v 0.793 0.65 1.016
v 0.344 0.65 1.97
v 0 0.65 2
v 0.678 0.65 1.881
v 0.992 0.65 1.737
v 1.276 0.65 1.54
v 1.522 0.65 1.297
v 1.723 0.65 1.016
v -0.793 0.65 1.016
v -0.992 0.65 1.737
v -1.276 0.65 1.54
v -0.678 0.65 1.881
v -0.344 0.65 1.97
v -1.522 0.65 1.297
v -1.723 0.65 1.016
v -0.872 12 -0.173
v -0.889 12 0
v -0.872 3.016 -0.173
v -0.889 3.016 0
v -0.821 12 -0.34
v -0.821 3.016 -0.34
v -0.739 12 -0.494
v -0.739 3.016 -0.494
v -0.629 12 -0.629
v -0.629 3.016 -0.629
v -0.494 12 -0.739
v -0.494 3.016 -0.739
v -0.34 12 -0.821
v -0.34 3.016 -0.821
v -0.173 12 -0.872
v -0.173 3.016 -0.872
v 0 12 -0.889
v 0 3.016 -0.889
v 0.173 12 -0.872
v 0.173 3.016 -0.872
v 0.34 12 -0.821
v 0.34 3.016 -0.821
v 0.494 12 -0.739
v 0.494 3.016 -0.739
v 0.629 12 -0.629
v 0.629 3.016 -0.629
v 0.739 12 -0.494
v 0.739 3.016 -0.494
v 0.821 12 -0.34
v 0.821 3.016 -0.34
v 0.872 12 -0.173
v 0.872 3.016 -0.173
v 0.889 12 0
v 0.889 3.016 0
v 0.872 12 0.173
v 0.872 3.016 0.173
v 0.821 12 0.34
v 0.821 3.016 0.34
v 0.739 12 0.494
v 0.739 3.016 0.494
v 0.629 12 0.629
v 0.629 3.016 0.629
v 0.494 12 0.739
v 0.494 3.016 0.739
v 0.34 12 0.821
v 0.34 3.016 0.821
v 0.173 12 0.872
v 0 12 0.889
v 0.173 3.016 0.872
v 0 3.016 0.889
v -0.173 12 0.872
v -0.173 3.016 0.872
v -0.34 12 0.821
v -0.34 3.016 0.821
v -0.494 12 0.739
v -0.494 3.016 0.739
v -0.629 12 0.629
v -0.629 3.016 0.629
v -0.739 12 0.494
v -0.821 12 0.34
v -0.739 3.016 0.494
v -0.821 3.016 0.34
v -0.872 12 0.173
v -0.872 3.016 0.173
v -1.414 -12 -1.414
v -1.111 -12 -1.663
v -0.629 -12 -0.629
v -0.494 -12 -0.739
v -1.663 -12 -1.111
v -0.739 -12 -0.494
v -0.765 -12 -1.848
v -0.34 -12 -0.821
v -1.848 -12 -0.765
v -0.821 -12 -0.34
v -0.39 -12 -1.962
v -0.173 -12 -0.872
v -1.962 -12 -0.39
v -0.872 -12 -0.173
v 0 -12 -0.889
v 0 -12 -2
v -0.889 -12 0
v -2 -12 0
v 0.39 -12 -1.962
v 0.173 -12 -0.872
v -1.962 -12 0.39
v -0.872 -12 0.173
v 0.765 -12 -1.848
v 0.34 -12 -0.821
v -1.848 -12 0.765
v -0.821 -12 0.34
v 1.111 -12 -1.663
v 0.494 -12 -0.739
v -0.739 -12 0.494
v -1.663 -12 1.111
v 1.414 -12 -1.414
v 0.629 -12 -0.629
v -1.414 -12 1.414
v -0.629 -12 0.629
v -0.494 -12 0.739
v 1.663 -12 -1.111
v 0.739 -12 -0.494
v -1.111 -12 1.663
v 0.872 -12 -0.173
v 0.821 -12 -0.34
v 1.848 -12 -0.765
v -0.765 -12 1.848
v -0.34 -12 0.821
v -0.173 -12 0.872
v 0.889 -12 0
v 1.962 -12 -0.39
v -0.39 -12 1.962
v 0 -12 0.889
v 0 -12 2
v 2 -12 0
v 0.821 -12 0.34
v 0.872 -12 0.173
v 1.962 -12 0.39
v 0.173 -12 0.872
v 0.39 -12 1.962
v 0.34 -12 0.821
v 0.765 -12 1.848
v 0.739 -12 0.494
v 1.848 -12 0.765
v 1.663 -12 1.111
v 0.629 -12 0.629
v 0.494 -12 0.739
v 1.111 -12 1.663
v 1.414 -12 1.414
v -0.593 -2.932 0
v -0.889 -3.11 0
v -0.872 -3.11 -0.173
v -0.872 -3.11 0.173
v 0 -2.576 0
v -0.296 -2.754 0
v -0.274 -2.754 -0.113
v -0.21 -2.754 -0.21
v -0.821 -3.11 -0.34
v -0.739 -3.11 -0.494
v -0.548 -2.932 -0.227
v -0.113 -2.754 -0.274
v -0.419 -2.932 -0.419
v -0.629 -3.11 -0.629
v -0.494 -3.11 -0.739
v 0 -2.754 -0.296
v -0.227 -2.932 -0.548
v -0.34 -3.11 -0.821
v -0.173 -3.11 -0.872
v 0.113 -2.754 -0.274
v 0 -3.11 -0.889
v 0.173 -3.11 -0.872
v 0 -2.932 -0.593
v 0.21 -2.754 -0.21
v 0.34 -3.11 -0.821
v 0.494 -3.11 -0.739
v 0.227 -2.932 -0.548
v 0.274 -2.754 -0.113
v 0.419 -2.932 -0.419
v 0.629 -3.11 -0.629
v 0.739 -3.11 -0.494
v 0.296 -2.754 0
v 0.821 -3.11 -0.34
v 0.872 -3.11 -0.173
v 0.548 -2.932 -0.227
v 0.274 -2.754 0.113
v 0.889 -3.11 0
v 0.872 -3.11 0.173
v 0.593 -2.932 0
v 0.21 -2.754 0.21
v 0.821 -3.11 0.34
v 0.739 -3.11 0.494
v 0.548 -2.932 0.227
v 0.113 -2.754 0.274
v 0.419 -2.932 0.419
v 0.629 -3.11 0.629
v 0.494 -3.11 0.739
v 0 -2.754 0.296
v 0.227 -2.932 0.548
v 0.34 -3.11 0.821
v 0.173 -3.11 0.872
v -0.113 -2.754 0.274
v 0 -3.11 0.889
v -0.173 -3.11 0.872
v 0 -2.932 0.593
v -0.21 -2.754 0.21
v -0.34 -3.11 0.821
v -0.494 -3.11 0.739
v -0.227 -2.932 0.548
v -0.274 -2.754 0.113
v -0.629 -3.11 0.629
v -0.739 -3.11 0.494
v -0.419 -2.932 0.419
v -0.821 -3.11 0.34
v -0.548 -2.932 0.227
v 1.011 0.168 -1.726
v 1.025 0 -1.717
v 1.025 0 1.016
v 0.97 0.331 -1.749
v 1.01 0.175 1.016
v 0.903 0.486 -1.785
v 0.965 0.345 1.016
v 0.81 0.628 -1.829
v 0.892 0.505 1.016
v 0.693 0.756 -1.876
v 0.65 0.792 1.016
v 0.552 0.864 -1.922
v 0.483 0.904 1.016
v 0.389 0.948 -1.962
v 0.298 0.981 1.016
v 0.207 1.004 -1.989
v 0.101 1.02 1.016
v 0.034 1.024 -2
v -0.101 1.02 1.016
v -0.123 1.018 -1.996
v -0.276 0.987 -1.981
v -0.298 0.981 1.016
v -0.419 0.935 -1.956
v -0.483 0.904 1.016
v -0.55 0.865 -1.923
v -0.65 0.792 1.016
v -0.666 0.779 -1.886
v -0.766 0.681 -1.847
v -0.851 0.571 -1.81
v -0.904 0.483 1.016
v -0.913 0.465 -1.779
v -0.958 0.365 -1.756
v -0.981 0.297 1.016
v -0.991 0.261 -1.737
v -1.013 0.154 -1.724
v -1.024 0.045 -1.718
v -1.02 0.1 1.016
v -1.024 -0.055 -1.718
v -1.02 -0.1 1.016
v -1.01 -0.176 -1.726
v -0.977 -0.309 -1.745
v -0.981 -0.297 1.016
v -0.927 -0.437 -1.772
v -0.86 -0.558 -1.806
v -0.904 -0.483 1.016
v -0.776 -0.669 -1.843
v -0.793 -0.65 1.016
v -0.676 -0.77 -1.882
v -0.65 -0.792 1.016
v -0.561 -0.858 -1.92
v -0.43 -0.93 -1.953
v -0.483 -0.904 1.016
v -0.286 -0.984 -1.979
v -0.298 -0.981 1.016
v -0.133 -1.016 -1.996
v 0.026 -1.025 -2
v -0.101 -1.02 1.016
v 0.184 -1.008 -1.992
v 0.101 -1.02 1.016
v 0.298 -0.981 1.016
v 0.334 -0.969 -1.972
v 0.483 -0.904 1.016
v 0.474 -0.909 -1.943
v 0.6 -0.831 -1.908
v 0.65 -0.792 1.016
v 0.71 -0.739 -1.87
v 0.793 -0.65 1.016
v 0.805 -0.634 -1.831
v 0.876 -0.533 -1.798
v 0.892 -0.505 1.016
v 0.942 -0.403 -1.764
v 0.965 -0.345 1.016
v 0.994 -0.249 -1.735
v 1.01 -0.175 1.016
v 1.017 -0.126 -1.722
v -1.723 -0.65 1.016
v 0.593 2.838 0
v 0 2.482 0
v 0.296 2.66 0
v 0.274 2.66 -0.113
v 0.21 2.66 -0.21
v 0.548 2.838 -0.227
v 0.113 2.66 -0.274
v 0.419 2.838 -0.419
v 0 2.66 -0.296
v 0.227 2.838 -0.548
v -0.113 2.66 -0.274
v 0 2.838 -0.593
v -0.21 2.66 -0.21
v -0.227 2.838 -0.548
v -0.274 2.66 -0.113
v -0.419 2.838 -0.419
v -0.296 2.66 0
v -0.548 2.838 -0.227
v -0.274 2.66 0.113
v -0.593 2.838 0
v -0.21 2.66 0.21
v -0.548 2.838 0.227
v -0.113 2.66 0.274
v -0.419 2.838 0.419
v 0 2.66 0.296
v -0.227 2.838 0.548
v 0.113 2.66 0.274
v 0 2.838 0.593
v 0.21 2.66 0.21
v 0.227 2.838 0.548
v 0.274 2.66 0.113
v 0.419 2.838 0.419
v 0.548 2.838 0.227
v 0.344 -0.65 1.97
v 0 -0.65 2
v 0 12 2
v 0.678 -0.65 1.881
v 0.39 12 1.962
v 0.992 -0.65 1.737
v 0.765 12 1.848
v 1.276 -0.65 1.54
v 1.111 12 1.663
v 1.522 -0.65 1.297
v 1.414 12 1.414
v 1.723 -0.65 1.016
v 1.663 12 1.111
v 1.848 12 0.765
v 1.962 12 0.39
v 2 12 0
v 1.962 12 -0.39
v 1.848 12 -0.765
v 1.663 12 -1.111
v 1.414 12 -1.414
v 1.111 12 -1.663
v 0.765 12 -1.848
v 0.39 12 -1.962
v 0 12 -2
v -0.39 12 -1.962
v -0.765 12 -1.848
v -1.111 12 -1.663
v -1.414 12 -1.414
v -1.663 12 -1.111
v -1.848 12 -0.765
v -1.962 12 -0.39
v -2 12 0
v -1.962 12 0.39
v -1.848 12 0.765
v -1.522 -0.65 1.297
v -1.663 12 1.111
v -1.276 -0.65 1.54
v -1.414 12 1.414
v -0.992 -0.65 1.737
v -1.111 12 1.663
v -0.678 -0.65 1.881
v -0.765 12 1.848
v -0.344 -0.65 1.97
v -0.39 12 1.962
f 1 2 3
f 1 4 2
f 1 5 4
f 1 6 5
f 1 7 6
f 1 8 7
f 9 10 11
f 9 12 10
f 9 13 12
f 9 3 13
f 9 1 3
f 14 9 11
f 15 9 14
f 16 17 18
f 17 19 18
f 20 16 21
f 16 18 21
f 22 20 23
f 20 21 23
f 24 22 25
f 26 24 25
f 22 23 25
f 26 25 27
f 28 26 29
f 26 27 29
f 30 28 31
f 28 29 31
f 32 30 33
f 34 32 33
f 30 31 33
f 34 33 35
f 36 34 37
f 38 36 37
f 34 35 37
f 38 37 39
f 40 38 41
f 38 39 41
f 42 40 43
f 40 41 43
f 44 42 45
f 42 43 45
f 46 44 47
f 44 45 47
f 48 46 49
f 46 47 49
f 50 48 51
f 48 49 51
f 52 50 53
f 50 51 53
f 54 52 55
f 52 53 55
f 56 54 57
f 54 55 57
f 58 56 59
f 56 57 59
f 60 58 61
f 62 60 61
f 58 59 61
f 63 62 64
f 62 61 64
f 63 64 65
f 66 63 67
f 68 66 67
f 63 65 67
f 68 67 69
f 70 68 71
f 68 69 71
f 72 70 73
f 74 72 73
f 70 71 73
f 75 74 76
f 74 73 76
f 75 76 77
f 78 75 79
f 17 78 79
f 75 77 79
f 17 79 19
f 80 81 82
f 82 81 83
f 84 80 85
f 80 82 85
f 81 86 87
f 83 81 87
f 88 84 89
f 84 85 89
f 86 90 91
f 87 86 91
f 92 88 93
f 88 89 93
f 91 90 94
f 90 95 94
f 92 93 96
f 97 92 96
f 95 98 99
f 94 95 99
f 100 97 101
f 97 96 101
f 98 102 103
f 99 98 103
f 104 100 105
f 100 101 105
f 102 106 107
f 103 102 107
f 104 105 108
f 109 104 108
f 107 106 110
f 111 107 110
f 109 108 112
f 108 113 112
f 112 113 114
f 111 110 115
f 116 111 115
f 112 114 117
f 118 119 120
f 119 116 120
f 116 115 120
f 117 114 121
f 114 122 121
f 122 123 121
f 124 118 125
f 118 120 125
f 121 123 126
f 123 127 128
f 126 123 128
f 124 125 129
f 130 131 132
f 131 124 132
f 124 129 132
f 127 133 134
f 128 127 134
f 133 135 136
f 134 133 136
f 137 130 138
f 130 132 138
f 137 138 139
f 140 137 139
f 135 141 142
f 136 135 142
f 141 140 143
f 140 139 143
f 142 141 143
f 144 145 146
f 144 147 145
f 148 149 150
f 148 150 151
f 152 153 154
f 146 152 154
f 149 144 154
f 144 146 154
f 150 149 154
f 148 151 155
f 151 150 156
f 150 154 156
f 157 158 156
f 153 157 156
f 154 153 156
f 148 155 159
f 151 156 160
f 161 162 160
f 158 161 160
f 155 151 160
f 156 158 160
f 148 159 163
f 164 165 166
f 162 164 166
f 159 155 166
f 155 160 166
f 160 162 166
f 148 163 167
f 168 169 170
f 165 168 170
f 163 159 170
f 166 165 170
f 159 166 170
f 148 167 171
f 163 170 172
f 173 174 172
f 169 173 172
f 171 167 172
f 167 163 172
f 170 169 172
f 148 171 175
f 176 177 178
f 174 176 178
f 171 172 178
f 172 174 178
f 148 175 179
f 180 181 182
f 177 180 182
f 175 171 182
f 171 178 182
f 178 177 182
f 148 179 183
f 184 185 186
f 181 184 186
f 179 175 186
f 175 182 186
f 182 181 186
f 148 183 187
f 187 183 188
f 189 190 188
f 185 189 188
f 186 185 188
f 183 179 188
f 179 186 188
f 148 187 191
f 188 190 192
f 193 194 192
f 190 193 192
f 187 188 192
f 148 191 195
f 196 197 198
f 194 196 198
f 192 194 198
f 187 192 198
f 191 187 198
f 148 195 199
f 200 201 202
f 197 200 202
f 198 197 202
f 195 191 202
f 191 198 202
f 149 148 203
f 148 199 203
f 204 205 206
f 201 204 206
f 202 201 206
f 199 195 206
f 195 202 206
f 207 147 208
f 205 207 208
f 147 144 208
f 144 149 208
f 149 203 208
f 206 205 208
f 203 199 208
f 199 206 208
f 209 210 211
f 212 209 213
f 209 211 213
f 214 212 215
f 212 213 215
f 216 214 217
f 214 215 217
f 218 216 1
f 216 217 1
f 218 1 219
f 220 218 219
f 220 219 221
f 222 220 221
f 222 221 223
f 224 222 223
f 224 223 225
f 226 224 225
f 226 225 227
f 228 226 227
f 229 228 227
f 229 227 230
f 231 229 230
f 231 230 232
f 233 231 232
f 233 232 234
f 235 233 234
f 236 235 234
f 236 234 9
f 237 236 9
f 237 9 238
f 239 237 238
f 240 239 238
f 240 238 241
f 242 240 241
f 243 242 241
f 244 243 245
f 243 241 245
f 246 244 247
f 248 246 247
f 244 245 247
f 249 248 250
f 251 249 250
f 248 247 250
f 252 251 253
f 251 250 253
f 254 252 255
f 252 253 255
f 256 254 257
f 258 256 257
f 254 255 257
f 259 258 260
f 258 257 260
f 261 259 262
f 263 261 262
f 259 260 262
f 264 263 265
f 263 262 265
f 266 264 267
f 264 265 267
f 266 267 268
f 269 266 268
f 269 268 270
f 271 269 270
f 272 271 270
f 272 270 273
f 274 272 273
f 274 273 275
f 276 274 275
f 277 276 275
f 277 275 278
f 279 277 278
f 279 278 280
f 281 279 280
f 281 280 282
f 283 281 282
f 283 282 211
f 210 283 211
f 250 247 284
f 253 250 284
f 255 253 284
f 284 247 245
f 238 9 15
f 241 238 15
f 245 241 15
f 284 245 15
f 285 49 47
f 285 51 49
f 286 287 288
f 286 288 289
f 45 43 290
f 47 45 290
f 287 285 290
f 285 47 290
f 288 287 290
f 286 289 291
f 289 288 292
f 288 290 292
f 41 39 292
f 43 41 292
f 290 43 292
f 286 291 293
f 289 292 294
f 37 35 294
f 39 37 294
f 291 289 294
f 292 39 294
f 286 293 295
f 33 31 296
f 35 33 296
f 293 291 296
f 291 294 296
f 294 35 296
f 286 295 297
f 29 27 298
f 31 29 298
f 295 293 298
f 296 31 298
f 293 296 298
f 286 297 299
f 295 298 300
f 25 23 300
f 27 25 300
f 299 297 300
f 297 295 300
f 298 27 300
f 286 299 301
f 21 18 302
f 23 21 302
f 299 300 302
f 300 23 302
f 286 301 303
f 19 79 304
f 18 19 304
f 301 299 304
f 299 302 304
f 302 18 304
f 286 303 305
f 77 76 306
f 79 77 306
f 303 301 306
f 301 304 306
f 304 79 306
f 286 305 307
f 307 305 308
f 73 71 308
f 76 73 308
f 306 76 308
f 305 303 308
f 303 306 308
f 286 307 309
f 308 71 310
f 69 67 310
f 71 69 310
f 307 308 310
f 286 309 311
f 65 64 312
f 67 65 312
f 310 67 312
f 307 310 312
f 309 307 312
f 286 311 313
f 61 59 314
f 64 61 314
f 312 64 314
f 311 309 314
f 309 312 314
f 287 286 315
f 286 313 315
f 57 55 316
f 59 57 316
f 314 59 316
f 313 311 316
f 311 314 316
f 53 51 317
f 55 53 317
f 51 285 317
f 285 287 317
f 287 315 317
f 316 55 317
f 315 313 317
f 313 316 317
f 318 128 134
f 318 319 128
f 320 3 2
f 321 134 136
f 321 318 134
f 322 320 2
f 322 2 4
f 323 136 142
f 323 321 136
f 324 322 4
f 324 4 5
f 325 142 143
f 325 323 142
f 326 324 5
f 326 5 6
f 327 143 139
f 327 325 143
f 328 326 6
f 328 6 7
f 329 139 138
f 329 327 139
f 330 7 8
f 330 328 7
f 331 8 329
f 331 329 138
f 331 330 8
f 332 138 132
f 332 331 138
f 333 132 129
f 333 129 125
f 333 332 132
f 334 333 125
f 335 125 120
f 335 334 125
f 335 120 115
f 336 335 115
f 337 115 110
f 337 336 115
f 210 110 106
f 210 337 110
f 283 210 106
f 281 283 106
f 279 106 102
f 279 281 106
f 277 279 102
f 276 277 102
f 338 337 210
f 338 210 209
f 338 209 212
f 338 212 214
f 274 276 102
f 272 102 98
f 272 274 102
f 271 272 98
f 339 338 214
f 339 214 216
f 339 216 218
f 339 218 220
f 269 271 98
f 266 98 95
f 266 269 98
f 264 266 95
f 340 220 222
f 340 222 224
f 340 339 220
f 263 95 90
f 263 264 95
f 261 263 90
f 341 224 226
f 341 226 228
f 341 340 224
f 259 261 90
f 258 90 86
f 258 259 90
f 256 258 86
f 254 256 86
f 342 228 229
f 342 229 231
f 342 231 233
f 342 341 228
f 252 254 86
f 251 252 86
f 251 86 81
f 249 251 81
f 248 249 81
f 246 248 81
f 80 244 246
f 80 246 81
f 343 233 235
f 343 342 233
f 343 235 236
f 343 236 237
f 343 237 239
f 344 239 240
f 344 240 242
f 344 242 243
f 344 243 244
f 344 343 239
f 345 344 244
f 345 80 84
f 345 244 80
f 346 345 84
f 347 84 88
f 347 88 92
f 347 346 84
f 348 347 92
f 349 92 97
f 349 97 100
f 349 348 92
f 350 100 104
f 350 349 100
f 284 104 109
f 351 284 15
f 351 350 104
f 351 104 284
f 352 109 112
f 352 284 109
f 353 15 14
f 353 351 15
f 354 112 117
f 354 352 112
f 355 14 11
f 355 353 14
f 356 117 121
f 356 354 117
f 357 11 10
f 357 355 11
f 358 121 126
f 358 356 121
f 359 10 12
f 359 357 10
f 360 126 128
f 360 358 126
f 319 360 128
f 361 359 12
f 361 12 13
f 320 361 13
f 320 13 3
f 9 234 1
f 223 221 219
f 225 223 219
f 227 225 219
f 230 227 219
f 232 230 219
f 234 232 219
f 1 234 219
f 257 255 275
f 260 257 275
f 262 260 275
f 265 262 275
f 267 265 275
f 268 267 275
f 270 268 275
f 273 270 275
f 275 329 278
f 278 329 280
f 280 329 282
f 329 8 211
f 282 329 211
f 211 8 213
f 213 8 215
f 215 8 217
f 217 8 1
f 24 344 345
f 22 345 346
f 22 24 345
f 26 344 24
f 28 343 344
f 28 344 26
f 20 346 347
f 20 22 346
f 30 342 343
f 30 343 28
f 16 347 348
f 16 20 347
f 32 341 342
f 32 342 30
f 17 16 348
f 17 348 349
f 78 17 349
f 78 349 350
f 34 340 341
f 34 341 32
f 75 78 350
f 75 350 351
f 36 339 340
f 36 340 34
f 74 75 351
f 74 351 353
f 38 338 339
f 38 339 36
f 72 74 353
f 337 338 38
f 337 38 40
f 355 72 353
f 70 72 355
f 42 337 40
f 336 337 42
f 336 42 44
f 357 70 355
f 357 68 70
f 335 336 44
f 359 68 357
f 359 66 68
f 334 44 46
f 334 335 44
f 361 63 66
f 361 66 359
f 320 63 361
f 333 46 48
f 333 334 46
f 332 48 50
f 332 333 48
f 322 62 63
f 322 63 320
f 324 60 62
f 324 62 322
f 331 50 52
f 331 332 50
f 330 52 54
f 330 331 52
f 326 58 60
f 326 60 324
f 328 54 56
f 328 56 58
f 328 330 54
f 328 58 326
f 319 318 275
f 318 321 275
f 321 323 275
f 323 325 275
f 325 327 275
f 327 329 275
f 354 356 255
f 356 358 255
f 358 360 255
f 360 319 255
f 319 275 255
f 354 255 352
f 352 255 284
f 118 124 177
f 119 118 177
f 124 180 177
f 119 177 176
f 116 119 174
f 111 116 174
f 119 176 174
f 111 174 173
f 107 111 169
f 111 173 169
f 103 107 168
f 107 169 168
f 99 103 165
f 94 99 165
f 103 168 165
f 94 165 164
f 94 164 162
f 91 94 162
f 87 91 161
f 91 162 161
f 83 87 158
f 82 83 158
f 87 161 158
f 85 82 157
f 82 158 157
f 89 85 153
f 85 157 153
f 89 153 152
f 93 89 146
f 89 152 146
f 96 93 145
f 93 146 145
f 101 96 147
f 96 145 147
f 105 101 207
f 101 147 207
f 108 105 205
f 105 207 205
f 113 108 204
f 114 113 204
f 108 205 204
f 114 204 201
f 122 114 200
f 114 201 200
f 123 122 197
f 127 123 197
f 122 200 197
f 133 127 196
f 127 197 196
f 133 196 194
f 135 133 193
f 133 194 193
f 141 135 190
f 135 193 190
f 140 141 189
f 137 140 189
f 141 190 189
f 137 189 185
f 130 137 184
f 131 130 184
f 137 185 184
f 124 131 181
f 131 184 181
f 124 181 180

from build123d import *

# Parameters (mm, degrees)
SKETCH1_R                 = 2
BOSS_EXTRUDE1_DEPTH       = 12
SKETCH2_R                 = 1.025
CUT_EXTRUDE1_DEPTH        = 15.24
SKETCH3_W                 = 4
SKETCH3_H                 = 1.3
CUT_EXTRUDE2_DEPTH        = 15.24
F_2_56_TAPPED_HOLE1_D     = 1.778
F_2_56_TAPPED_HOLE1_DEPTH = 8.98398
F_2_56_TAPPED_HOLE1_TIP   = 0.53416509
F_2_56_TAPPED_HOLE2_D     = 1.778
F_2_56_TAPPED_HOLE2_DEPTH = 8.89
F_2_56_TAPPED_HOLE2_TIP   = 0.53416509


with BuildPart() as part:
    # Sketch1 → Boss-Extrude1 (new, symmetric)
    with BuildSketch(Plane(origin=(0, 0, 0), x_dir=(1, 0, 0), z_dir=(0, 1, 0))):
        with Locations(Location((0, 0, 0), (0, 0, 270))):
            Circle(SKETCH1_R)
    extrude(amount=BOSS_EXTRUDE1_DEPTH, both=True)

    # Sketch2 → Cut-Extrude1 (cut)
    with BuildSketch(Plane.XY.offset(1.016)):
        Circle(SKETCH2_R)
    extrude(amount=-CUT_EXTRUDE1_DEPTH, mode=Mode.SUBTRACT)

    # Sketch3 → Cut-Extrude2 (cut)
    with BuildSketch(Plane(origin=(0, 0, 1.016), x_dir=(-1, 0, 0), z_dir=(0, 0, -1))):
        Rectangle(SKETCH3_W, SKETCH3_H)
    extrude(amount=-CUT_EXTRUDE2_DEPTH, mode=Mode.SUBTRACT)

    # #2-56 Tapped Hole1
    with Locations(Plane(origin=(0, 12, 0), x_dir=(1, 0, 0), z_dir=(0, 1, 0))):
        with Locations((0, 0)):
            Hole(F_2_56_TAPPED_HOLE1_D / 2, depth=F_2_56_TAPPED_HOLE1_DEPTH)
            with Locations((0, 0, -(F_2_56_TAPPED_HOLE1_DEPTH + F_2_56_TAPPED_HOLE1_TIP / 2))):  # 118° drill point
                Cone(0, F_2_56_TAPPED_HOLE1_D / 2, F_2_56_TAPPED_HOLE1_TIP, mode=Mode.SUBTRACT)

    # #2-56 Tapped Hole2
    with Locations(Plane(origin=(0, -12, 0), x_dir=(-1, 0, 0), z_dir=(0, -1, 0))):
        with Locations((0, 0)):
            Hole(F_2_56_TAPPED_HOLE2_D / 2, depth=F_2_56_TAPPED_HOLE2_DEPTH)
            with Locations((0, 0, -(F_2_56_TAPPED_HOLE2_DEPTH + F_2_56_TAPPED_HOLE2_TIP / 2))):  # 118° drill point
                Cone(0, F_2_56_TAPPED_HOLE2_D / 2, F_2_56_TAPPED_HOLE2_TIP, mode=Mode.SUBTRACT)


solid = part.part
